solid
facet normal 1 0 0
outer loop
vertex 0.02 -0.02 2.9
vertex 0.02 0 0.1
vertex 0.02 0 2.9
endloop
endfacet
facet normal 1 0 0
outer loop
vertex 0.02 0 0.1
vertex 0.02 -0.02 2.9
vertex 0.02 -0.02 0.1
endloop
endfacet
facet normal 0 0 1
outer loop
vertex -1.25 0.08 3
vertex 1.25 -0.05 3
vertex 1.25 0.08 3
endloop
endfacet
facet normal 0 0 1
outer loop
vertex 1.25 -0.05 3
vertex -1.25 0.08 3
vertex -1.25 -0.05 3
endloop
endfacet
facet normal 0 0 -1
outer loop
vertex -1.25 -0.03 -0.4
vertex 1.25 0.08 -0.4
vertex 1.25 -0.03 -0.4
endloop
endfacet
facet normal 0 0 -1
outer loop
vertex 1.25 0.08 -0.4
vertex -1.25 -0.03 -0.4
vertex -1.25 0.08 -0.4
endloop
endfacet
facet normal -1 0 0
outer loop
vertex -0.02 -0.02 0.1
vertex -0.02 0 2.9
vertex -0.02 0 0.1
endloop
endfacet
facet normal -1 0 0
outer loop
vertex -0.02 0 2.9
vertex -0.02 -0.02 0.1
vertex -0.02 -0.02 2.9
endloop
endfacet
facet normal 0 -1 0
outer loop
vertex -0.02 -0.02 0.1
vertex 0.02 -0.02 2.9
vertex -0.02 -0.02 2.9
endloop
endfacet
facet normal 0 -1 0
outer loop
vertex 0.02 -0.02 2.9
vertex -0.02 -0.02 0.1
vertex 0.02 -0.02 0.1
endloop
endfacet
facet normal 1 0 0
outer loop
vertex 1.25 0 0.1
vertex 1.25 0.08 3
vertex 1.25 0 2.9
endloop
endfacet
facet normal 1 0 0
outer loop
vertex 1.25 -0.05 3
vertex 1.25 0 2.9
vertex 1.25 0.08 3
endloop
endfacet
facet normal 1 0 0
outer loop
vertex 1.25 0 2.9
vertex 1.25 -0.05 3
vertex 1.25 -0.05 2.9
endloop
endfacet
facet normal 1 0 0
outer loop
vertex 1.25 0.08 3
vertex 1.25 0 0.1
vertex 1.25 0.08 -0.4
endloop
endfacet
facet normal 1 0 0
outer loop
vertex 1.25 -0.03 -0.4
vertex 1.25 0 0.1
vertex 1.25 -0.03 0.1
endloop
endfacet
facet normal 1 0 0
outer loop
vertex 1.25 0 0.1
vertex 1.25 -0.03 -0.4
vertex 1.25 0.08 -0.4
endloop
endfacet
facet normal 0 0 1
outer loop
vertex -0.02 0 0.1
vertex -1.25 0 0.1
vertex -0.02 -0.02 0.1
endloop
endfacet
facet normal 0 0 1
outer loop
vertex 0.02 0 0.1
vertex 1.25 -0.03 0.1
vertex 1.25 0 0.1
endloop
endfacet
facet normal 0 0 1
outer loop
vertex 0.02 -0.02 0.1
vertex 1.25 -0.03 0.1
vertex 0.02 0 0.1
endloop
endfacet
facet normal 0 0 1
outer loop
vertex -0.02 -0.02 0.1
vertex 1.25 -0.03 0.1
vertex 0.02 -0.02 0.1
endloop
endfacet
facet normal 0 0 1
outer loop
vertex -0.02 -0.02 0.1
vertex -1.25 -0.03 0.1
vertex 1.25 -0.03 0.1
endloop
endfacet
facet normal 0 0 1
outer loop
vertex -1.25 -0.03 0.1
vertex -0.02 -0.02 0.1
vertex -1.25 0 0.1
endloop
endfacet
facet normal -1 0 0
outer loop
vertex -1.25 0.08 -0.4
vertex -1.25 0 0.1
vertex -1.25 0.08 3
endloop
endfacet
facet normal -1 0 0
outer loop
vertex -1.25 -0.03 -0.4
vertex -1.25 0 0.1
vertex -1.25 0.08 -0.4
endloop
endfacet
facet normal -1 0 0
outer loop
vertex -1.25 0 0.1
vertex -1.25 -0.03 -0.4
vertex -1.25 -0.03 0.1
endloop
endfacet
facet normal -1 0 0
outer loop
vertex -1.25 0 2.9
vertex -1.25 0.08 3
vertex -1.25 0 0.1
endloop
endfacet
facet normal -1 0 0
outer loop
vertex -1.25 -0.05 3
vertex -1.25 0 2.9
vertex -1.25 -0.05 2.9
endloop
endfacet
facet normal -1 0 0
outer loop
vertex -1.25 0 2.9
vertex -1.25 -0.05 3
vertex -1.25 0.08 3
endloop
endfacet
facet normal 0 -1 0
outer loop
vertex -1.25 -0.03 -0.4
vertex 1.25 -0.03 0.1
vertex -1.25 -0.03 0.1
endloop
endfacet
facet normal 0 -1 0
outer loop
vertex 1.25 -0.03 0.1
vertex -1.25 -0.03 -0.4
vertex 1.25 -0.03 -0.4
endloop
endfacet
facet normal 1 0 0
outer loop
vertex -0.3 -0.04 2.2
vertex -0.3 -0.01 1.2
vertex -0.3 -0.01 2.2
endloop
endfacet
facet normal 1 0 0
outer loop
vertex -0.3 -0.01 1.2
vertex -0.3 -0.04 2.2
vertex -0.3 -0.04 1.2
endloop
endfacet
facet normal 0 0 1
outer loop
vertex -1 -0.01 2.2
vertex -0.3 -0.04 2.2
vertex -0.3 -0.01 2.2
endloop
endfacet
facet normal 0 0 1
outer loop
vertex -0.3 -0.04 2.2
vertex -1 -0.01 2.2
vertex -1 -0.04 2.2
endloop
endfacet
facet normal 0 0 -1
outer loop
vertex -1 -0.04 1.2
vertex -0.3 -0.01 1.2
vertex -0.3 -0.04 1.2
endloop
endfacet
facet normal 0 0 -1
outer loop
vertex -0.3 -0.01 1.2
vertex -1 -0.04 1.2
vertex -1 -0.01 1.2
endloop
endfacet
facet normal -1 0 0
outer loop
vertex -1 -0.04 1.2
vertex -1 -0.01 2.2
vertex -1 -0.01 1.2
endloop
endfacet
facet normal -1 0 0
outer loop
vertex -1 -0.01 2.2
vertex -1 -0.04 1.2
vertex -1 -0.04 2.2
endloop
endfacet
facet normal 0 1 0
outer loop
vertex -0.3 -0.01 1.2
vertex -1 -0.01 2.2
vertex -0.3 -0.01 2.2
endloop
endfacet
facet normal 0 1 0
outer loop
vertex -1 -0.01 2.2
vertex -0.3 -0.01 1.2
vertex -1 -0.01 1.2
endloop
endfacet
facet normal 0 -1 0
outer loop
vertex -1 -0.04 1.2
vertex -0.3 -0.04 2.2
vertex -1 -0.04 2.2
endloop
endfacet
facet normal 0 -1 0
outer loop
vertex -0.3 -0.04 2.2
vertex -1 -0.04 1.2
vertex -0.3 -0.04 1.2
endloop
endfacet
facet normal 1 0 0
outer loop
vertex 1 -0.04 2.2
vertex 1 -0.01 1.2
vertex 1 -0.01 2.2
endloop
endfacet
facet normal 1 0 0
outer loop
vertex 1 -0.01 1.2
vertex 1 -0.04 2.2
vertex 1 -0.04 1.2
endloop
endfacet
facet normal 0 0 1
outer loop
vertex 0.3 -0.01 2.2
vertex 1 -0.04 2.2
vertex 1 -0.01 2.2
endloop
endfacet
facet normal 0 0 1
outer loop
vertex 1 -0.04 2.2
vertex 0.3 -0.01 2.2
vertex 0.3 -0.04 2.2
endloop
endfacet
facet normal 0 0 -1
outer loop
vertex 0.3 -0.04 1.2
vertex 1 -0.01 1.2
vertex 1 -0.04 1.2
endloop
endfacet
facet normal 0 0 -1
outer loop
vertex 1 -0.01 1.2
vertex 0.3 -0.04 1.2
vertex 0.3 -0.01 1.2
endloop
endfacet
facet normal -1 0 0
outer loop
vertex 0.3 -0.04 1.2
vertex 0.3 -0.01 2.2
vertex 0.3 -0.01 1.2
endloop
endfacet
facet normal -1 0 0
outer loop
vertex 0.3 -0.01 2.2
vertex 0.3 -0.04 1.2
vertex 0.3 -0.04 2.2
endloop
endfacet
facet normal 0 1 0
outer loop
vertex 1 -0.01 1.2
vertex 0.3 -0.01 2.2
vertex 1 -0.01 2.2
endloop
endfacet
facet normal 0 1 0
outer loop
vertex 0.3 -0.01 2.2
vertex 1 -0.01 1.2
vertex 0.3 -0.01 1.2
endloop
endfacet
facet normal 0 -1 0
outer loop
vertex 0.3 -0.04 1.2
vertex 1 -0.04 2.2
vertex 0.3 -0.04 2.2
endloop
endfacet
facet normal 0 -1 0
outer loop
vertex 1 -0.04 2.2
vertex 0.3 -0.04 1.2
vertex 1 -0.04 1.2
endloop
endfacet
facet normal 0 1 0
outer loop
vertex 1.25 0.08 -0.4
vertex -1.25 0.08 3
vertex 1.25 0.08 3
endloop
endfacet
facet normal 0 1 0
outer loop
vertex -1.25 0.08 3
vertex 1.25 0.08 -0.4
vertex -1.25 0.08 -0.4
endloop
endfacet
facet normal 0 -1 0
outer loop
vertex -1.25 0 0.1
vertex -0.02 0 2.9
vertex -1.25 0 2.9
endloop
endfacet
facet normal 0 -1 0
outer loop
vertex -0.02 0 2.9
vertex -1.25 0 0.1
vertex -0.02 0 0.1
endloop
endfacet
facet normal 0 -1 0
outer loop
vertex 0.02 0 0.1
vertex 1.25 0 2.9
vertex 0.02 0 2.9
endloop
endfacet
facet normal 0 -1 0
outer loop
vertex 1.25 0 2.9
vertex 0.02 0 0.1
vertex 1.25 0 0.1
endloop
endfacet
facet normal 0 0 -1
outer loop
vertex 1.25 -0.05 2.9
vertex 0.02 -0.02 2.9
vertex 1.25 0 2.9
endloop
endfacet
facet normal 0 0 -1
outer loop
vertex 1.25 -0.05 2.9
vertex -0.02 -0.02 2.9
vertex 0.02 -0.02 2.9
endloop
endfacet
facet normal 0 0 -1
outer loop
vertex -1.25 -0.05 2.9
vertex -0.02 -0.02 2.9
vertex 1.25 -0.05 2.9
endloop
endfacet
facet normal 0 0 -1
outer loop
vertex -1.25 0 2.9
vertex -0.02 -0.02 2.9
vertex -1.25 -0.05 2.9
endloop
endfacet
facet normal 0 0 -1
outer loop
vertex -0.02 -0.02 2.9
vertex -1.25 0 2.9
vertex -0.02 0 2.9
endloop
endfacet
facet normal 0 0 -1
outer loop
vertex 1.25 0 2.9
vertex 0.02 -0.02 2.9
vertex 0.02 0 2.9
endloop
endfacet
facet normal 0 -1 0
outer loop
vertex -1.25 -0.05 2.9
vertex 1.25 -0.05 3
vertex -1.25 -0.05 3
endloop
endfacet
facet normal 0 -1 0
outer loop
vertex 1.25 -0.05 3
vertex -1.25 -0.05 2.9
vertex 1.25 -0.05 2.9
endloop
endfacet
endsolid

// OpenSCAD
// Tent shell kit: wall window alt. See lib/lodge_kit.scad.
include <lib/lodge_kit.scad>
kind = "tent";
wall_window_alt();
